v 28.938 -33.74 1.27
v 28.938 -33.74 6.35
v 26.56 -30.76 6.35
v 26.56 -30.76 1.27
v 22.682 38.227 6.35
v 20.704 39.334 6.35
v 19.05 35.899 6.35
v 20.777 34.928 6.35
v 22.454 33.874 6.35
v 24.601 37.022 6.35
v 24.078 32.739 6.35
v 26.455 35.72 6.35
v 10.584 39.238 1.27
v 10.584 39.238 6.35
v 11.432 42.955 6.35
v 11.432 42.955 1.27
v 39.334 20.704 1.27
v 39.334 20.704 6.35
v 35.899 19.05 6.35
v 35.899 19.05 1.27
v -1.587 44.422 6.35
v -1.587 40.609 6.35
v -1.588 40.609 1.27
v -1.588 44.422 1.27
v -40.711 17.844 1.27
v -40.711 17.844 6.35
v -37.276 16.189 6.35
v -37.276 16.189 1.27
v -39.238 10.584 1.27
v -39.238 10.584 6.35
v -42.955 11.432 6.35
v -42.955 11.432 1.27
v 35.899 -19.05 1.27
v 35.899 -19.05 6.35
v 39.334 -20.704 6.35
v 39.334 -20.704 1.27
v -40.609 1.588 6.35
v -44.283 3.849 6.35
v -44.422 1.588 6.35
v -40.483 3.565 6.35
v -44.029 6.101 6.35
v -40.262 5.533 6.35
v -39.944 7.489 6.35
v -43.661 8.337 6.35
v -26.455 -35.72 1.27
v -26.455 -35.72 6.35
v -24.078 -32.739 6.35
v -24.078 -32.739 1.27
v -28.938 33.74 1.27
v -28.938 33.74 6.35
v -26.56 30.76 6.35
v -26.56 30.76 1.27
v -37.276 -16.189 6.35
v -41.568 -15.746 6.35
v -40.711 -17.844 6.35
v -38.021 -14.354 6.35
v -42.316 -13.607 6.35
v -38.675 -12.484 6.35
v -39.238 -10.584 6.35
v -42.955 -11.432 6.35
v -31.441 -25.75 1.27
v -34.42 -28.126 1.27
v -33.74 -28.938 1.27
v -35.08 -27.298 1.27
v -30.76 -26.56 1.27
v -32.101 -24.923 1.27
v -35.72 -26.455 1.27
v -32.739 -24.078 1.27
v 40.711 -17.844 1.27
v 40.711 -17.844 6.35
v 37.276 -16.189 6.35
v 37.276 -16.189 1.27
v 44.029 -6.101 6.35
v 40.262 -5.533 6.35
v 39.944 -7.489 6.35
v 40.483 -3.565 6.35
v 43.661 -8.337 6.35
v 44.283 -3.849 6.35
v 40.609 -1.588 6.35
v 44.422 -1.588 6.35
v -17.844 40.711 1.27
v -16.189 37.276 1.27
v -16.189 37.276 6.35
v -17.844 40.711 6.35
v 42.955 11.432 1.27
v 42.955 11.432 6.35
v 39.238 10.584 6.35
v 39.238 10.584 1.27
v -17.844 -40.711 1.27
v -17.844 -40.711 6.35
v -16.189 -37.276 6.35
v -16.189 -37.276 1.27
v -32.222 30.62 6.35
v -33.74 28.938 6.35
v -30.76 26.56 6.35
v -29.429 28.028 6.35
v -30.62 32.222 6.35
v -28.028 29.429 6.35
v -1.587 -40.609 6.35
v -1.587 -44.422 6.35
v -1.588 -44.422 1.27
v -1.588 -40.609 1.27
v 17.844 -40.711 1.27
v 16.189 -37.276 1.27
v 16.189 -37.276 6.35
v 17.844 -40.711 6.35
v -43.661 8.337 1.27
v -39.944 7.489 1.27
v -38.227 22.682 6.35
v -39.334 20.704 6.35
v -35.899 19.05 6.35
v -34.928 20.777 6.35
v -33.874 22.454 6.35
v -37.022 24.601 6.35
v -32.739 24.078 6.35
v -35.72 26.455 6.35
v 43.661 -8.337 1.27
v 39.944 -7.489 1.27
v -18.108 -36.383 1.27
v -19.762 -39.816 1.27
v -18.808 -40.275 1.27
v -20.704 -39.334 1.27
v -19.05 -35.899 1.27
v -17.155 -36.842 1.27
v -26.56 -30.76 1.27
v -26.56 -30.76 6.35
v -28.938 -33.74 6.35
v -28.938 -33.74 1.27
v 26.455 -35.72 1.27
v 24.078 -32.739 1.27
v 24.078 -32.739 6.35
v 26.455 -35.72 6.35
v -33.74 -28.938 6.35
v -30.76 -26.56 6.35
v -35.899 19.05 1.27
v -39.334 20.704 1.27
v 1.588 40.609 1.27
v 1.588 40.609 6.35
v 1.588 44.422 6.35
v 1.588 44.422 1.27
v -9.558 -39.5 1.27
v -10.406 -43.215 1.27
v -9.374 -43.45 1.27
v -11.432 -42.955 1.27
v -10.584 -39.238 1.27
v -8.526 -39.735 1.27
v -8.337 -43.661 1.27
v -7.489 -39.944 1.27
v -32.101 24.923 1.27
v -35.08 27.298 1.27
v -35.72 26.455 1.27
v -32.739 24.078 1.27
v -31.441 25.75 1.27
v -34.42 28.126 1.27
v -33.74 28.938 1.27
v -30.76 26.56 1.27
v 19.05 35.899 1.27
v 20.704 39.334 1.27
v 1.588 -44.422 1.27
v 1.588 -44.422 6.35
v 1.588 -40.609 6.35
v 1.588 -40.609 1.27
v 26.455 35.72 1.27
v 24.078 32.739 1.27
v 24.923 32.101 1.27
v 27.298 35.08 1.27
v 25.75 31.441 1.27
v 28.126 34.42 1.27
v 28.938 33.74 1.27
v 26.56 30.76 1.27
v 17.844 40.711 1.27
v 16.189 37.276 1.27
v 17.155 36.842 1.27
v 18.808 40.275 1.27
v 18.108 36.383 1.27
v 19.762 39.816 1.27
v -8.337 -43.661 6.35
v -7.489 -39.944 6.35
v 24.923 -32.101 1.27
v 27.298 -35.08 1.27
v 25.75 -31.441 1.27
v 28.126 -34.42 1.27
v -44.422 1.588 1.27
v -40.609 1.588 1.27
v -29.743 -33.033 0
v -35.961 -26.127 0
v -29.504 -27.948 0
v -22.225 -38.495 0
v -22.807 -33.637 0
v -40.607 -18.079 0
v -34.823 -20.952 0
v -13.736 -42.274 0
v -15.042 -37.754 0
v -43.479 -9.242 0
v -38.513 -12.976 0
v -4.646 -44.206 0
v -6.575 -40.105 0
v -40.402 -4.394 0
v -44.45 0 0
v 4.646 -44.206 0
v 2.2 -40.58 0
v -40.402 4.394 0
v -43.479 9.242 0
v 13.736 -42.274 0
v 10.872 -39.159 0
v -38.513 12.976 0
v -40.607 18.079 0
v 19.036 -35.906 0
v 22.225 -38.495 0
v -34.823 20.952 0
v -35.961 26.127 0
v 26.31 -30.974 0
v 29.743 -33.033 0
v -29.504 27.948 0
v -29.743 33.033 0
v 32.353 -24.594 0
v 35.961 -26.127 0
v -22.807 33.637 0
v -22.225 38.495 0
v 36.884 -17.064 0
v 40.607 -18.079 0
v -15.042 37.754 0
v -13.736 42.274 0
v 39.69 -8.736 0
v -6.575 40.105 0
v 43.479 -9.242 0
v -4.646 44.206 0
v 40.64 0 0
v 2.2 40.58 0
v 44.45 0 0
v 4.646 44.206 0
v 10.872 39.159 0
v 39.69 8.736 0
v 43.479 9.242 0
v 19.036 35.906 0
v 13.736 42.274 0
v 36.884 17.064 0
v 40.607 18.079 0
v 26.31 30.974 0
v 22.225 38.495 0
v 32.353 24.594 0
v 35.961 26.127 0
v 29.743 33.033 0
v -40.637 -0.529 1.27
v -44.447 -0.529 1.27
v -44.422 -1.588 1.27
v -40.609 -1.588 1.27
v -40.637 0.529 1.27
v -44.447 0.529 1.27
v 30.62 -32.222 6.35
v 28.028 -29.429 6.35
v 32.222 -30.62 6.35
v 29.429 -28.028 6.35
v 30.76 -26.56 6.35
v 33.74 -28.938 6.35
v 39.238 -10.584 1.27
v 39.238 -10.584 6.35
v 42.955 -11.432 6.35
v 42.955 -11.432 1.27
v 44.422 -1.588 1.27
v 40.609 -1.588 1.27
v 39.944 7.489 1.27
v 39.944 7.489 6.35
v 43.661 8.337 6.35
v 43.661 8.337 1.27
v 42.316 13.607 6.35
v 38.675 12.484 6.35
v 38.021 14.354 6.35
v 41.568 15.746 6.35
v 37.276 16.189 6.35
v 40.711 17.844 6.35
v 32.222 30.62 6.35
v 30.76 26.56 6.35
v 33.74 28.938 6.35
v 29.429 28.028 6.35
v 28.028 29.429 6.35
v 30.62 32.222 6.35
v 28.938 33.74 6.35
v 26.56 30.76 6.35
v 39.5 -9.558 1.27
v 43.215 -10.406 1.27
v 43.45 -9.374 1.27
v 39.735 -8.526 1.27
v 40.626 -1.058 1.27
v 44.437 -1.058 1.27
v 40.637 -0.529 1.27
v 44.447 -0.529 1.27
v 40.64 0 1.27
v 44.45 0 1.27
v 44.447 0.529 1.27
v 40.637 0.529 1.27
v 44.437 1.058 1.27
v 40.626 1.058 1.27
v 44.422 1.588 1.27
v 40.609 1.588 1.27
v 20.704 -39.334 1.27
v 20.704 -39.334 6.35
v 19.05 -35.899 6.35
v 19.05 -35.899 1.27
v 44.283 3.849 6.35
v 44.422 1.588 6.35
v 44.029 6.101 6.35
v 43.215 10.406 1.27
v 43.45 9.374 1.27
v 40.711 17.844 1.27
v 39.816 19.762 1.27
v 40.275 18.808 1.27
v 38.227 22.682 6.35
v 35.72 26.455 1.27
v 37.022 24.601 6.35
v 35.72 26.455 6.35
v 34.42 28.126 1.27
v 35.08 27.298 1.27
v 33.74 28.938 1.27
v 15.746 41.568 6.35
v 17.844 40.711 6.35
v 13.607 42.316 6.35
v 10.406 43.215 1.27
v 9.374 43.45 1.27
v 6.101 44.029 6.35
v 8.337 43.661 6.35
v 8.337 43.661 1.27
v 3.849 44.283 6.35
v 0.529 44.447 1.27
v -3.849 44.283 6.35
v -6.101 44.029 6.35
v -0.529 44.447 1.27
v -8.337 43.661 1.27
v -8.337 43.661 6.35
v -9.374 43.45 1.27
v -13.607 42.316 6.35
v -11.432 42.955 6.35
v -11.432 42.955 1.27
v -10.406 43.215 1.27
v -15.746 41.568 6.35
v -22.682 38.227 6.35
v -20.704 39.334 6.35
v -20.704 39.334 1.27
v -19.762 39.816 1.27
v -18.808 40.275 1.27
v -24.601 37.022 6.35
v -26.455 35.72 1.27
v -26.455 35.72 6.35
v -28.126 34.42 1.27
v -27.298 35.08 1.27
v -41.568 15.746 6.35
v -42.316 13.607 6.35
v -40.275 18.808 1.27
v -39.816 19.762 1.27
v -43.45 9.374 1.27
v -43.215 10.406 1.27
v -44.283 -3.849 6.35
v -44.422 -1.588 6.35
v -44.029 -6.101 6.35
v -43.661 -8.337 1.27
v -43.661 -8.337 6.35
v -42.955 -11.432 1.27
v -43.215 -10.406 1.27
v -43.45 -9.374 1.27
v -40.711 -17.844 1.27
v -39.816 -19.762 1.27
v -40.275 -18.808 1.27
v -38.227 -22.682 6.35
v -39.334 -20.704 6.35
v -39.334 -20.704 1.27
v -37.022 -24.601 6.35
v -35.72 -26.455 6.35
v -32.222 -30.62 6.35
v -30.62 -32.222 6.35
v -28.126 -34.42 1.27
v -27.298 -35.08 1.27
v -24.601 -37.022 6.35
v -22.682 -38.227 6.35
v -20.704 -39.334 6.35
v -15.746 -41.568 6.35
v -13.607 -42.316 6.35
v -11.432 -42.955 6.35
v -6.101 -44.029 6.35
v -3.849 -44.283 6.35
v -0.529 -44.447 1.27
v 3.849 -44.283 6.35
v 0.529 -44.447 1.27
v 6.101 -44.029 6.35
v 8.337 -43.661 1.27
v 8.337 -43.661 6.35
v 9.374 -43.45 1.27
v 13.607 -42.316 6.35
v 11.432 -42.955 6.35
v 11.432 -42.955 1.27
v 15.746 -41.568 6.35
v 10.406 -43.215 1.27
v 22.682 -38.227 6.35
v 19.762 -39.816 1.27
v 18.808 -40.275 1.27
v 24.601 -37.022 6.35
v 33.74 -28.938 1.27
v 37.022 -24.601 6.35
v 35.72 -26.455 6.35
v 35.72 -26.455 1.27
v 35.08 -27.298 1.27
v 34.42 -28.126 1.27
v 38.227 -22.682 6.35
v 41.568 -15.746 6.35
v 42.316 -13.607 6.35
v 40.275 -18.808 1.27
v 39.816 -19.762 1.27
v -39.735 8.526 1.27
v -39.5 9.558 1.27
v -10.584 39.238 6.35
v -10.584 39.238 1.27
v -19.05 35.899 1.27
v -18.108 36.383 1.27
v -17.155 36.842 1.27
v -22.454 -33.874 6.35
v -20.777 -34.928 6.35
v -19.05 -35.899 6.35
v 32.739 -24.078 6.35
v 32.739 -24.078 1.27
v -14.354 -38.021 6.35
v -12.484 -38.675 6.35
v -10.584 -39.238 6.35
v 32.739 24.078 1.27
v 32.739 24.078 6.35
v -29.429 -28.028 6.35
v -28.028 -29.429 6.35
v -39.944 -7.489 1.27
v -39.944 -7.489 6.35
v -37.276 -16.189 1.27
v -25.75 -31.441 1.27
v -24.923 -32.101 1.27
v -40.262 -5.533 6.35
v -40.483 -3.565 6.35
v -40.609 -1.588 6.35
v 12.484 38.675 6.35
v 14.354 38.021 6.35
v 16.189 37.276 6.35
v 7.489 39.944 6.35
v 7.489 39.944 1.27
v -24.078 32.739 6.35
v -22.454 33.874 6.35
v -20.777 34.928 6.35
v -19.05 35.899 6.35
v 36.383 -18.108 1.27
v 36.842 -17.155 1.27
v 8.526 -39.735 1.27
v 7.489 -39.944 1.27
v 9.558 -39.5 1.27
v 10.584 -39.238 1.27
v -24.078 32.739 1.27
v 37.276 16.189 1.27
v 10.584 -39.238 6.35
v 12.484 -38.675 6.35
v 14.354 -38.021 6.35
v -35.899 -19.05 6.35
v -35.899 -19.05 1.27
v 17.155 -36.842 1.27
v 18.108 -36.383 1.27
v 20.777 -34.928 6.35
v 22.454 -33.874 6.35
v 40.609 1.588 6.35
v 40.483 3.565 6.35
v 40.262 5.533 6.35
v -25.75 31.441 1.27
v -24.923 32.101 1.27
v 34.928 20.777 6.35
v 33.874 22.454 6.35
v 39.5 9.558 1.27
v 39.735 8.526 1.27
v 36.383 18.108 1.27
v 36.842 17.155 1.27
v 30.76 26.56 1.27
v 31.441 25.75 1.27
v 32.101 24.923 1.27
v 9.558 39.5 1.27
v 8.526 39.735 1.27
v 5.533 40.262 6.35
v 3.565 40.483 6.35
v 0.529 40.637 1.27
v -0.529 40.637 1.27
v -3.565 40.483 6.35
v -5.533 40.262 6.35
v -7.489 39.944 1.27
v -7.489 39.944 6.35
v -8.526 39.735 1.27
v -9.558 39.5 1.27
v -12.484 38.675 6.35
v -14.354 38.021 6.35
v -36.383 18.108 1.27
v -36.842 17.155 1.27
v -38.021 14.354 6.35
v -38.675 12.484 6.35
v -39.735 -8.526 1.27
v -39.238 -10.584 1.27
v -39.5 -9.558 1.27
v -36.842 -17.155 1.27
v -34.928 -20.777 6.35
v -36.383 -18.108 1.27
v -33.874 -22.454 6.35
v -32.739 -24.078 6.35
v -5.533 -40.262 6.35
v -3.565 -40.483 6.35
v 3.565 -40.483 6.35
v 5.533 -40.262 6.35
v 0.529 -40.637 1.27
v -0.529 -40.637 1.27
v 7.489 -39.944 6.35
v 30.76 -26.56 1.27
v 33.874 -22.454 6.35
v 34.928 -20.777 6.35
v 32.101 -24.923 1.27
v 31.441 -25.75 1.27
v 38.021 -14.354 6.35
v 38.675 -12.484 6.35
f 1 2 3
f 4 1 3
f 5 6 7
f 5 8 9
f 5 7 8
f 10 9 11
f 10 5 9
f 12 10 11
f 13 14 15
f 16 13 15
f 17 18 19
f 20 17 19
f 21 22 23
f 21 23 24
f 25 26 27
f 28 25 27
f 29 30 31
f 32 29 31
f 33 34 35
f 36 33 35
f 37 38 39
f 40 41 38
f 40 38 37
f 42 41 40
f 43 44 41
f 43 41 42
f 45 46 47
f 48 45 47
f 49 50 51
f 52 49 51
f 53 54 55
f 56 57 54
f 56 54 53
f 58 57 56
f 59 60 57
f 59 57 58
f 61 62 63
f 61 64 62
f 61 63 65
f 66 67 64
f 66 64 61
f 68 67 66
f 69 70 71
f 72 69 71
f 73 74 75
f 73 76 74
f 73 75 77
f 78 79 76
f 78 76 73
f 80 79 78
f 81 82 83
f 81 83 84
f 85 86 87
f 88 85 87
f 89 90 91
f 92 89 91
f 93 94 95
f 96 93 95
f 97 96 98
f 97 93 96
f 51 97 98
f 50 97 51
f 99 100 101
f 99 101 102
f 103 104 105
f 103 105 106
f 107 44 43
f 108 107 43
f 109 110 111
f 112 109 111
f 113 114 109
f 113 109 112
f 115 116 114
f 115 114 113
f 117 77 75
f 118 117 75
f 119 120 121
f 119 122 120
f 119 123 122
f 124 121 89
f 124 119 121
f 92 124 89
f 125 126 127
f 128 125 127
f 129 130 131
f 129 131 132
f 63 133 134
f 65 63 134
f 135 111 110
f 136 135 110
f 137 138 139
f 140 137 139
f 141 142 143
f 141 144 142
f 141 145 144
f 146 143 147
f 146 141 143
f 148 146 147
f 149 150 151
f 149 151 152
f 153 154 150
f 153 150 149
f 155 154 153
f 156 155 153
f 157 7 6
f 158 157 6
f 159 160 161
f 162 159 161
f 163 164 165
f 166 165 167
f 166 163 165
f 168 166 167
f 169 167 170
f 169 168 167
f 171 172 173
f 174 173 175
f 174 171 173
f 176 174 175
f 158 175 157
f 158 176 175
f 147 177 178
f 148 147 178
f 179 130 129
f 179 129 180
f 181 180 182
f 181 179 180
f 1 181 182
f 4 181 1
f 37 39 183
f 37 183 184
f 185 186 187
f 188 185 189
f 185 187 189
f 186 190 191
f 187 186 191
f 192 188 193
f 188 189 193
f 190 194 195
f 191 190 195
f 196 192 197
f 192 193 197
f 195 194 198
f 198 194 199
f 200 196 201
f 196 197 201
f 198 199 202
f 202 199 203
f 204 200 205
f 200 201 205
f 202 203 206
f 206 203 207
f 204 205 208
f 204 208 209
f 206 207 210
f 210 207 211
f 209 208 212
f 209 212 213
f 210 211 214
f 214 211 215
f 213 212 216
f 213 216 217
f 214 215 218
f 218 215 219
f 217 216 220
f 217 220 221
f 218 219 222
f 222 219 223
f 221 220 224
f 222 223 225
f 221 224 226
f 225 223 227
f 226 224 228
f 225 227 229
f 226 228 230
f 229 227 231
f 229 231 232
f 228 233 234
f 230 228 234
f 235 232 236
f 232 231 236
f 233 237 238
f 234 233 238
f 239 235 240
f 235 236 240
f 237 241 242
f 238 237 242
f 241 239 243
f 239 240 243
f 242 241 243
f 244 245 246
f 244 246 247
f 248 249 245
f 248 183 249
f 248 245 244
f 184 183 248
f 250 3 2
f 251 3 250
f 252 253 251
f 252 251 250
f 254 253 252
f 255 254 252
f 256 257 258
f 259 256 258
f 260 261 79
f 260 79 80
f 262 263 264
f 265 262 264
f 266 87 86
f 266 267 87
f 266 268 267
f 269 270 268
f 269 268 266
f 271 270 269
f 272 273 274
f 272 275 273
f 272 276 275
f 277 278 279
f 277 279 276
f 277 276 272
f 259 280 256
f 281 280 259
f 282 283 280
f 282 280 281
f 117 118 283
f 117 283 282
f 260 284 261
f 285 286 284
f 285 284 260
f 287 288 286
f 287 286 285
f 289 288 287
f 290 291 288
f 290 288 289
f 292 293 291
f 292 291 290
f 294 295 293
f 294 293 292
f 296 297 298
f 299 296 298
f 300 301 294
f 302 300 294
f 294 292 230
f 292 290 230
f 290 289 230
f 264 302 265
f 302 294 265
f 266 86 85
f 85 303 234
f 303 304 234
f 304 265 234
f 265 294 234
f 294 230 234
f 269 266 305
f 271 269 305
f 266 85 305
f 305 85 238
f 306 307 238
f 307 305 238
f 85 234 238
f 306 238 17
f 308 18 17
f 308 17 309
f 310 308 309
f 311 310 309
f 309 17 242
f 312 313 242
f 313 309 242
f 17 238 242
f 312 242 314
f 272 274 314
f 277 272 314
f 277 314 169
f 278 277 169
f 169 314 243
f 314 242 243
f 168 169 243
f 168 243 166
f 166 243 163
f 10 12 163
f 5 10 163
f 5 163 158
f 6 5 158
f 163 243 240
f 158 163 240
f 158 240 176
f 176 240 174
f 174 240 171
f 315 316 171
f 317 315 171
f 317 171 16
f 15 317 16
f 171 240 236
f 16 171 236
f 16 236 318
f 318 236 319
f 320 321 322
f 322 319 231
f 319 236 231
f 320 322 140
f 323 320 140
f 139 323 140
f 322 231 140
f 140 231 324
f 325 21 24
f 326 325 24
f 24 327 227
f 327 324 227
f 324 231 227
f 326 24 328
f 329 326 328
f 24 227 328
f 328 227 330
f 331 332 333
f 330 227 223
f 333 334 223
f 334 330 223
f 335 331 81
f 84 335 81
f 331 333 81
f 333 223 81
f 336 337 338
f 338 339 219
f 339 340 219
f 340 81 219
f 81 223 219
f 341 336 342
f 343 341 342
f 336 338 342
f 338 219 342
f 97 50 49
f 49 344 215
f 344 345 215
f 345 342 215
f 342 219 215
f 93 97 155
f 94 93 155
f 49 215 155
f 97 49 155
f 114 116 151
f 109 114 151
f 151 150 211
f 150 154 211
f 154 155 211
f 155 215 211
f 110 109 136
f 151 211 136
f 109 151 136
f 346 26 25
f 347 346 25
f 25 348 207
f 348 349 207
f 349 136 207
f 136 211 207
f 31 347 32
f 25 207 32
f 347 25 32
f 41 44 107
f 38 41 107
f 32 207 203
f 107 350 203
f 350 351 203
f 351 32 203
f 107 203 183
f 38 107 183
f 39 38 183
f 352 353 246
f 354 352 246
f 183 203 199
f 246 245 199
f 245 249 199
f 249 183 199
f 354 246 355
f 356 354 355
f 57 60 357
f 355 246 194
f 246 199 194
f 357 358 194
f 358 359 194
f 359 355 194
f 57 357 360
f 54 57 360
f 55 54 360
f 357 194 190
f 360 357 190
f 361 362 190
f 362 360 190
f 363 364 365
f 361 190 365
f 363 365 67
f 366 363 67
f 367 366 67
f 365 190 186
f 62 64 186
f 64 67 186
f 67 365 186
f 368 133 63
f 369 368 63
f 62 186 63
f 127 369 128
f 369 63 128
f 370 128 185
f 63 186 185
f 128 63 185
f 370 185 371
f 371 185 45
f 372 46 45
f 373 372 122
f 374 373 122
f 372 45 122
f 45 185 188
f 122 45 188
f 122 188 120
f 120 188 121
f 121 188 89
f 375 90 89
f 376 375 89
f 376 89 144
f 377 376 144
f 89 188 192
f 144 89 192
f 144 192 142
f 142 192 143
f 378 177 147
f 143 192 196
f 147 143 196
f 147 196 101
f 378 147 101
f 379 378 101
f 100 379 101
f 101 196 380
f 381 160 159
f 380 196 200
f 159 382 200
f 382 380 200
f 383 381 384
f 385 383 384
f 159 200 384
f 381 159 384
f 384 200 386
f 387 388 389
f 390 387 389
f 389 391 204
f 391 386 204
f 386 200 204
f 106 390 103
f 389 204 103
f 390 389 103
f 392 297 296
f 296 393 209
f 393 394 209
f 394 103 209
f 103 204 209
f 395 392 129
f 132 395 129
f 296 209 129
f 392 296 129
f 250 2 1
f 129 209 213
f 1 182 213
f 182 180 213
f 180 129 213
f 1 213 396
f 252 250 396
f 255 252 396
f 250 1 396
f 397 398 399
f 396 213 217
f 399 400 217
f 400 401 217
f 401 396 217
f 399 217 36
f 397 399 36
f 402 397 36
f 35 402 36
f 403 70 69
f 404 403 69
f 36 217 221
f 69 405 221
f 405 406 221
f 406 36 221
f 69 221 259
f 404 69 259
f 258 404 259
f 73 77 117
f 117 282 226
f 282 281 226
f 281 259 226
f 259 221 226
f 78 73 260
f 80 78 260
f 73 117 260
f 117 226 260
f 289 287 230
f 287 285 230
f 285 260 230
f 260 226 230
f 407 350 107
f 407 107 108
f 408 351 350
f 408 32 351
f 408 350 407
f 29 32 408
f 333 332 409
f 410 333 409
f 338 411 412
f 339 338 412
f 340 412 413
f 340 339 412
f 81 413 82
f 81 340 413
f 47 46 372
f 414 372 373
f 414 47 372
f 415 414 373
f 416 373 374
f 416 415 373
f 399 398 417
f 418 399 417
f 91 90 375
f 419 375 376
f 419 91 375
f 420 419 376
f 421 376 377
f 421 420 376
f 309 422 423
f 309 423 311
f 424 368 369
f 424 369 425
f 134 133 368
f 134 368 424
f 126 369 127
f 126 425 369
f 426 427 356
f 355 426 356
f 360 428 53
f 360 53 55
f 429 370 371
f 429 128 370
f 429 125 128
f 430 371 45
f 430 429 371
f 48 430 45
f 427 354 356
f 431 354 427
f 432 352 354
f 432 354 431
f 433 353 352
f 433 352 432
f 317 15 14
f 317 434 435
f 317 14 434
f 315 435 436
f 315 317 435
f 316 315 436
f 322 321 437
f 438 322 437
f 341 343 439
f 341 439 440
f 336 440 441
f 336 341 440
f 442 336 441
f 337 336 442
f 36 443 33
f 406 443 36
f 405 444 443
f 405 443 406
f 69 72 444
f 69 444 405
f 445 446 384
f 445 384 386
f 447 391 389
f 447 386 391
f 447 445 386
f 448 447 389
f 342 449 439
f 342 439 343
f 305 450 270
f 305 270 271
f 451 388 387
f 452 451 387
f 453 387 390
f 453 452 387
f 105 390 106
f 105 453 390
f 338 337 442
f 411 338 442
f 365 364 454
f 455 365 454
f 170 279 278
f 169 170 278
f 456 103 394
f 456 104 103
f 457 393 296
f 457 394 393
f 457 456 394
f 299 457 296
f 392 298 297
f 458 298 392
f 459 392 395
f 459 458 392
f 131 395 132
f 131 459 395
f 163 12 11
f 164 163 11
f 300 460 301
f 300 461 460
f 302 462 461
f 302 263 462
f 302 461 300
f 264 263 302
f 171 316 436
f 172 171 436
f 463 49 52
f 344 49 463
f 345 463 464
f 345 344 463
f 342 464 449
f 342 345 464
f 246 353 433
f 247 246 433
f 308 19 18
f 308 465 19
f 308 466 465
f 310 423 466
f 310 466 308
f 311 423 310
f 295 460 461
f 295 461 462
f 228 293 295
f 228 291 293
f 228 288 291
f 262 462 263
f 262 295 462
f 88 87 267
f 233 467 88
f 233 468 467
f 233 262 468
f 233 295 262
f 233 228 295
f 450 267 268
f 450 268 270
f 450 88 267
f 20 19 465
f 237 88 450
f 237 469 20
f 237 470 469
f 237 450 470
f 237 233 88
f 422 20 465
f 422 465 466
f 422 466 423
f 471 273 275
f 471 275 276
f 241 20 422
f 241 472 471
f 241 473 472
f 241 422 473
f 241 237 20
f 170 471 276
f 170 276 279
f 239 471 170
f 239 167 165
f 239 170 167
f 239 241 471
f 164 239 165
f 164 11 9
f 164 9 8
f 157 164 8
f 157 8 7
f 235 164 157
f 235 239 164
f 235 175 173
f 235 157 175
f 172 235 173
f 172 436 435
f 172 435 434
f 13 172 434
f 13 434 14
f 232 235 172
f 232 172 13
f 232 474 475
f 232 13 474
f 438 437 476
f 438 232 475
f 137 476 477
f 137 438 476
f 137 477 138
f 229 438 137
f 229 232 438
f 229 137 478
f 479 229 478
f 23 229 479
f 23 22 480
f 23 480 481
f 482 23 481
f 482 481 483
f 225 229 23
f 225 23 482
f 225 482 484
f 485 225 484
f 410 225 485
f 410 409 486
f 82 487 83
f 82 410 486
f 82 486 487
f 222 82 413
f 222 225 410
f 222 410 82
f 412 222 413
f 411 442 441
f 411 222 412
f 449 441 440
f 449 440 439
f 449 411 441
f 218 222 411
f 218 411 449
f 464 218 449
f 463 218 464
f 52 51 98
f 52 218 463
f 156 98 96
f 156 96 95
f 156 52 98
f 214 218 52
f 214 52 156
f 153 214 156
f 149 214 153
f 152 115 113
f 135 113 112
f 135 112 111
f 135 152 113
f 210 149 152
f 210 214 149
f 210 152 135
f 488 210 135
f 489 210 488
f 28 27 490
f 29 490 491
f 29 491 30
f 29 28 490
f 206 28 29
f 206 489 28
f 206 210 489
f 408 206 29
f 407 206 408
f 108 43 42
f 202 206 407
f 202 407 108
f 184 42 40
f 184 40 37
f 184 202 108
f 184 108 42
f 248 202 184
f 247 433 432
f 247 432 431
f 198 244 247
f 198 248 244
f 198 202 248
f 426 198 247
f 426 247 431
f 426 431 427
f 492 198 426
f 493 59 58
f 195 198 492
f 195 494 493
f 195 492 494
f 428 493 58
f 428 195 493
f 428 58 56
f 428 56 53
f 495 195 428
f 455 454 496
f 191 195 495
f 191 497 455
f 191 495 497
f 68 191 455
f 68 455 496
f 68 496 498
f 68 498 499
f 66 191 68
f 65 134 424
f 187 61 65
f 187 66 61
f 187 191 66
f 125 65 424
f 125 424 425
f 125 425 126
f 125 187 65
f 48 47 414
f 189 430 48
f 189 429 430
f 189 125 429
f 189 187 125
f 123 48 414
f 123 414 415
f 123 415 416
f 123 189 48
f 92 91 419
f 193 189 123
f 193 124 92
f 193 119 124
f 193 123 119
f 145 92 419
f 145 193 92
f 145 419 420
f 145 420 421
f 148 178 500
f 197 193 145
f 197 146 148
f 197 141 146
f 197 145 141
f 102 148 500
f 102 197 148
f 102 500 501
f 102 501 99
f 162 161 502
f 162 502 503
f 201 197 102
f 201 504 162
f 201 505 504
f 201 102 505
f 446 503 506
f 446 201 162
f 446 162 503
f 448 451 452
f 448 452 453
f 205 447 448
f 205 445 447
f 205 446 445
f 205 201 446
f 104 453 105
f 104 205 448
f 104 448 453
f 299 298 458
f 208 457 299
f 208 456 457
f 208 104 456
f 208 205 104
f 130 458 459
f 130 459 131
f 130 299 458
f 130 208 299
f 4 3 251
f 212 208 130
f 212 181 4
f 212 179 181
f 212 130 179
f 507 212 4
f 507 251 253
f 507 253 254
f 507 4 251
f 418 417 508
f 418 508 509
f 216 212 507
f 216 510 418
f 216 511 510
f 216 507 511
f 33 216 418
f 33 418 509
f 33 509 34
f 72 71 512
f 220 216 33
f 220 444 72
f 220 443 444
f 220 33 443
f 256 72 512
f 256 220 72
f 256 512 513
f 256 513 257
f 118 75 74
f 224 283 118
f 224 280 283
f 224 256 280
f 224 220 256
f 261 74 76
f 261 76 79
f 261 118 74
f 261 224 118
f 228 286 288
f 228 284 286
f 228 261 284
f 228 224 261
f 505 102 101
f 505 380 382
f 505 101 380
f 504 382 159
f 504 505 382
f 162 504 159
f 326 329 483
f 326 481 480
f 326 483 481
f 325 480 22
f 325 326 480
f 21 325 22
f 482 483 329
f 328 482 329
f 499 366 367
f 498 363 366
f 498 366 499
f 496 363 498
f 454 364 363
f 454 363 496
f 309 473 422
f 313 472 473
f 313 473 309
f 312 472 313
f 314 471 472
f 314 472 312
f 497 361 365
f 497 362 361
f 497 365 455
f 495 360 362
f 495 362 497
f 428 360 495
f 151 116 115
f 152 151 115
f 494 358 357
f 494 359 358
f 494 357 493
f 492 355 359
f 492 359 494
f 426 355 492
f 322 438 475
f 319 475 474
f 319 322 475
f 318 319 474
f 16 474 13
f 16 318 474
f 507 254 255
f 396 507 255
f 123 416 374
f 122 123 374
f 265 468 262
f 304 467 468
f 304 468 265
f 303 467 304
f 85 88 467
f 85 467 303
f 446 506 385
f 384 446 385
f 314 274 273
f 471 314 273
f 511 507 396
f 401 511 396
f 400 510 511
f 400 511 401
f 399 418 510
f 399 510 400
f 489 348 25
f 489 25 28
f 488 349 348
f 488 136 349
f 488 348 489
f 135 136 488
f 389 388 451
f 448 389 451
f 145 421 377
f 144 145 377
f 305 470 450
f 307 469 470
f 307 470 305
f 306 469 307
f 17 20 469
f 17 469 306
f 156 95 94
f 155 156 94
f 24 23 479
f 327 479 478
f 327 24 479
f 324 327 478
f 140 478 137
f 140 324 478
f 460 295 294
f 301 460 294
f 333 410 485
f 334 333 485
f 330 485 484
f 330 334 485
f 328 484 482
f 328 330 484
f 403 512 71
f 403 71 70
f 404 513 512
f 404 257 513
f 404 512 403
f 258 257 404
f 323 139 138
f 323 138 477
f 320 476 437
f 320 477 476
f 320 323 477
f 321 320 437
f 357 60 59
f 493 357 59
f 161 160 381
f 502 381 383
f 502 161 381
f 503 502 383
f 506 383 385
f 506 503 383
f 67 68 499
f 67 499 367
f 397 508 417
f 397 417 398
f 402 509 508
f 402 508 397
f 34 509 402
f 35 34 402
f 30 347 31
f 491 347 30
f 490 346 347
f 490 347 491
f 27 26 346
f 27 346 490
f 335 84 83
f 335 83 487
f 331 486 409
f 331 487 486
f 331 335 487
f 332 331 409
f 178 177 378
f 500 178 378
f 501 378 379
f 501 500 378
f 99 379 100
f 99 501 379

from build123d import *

# Parameters (mm, degrees)
F0_R     = 44.45
F0_R_2   = 40.64
F1_DEPTH = 6.35
F2_W     = 6.626951
F2_H     = 3.175
F2_W_2   = 3.175
F2_H_2   = 6.626951
F3_DEPTH = 5.08


with BuildPart() as f1:
    # F0 (on Top) → F1 (new body)
    with BuildSketch(Plane.XY):
        Circle(F0_R)
        Circle(F0_R_2, mode=Mode.SUBTRACT)
    extrude(amount=F1_DEPTH)

    # F2 (on face) → F3 (cut)
    with BuildSketch(Plane.XY.offset(6.35)):
        with Locations((-42.241248, 0)):
            Rectangle(F2_W, F2_H)
        Polygon((-44.059319, 11.684578), (-44.765823, 8.589181), (-38.305023, 7.114546), (-37.598519, 10.209942), align=None)
        Polygon((-40.354597, 21.195742), (-41.732178, 18.335165), (-35.761501, 15.459839), (-34.38392, 18.320415), align=None)
        Polygon((-34.626327, 29.644063), (-36.605907, 27.161748), (-31.424748, 23.029911), (-29.445167, 25.512226), align=None)
        Polygon((-27.161748, 36.605907), (-29.644063, 34.626327), (-25.512226, 29.445167), (-23.029911, 31.424748), align=None)
        Polygon((-18.335165, 41.732178), (-21.195742, 40.354597), (-18.320415, 34.38392), (-15.459839, 35.761501), align=None)
        Polygon((-8.589181, 44.765823), (-11.684578, 44.059319), (-10.209942, 37.598519), (-7.114546, 38.305023), align=None)
        with Locations((0, 42.241248)):
            Rectangle(F2_W_2, F2_H_2)
        Polygon((11.684578, 44.059319), (8.589181, 44.765823), (7.114546, 38.305023), (10.209942, 37.598519), align=None)
        Polygon((21.195742, 40.354597), (18.335165, 41.732178), (15.459839, 35.761501), (18.320415, 34.38392), align=None)
        Polygon((29.644063, 34.626327), (27.161748, 36.605907), (23.029911, 31.424748), (25.512226, 29.445167), align=None)
        Polygon((36.605907, 27.161748), (34.626327, 29.644063), (29.445167, 25.512226), (31.424748, 23.029911), align=None)
        Polygon((41.732178, 18.335165), (40.354597, 21.195742), (34.38392, 18.320415), (35.761501, 15.459839), align=None)
        Polygon((44.765823, 8.589181), (44.059319, 11.684578), (37.598519, 10.209942), (38.305023, 7.114546), align=None)
        with Locations((42.241248, 0)):
            Rectangle(F2_W, F2_H)
        Polygon((-44.059319, -11.684578), (-37.598519, -10.209942), (-38.305023, -7.114546), (-44.765823, -8.589181), align=None)
        with Locations((0, -42.241248)):
            Rectangle(F2_W_2, F2_H_2)
        Polygon((21.195742, -40.354597), (18.320415, -34.38392), (15.459839, -35.761501), (18.335165, -41.732178), align=None)
        Polygon((-18.335165, -41.732178), (-15.459839, -35.761501), (-18.320415, -34.38392), (-21.195742, -40.354597), align=None)
        Polygon((-36.605907, -27.161748), (-34.626327, -29.644063), (-29.445167, -25.512226), (-31.424748, -23.029911), align=None)
        Polygon((40.354597, -21.195742), (41.732178, -18.335165), (35.761501, -15.459839), (34.38392, -18.320415), align=None)
        Polygon((27.161748, -36.605907), (29.644063, -34.626327), (25.512226, -29.445167), (23.029911, -31.424748), align=None)
        Polygon((34.626327, -29.644063), (36.605907, -27.161748), (31.424748, -23.029911), (29.445167, -25.512226), align=None)
        Polygon((-27.161748, -36.605907), (-23.029911, -31.424748), (-25.512226, -29.445167), (-29.644063, -34.626327), align=None)
        Polygon((44.765823, -8.589181), (38.305023, -7.114546), (37.598519, -10.209942), (44.059319, -11.684578), align=None)
        Polygon((-8.589181, -44.765823), (-7.114546, -38.305023), (-10.209942, -37.598519), (-11.684578, -44.059319), align=None)
        Polygon((-40.354597, -21.195742), (-34.38392, -18.320415), (-35.761501, -15.459839), (-41.732178, -18.335165), align=None)
        Polygon((8.589181, -44.765823), (11.684578, -44.059319), (10.209942, -37.598519), (7.114546, -38.305023), align=None)
    extrude(amount=-F3_DEPTH, mode=Mode.SUBTRACT)


solid = f1.part
